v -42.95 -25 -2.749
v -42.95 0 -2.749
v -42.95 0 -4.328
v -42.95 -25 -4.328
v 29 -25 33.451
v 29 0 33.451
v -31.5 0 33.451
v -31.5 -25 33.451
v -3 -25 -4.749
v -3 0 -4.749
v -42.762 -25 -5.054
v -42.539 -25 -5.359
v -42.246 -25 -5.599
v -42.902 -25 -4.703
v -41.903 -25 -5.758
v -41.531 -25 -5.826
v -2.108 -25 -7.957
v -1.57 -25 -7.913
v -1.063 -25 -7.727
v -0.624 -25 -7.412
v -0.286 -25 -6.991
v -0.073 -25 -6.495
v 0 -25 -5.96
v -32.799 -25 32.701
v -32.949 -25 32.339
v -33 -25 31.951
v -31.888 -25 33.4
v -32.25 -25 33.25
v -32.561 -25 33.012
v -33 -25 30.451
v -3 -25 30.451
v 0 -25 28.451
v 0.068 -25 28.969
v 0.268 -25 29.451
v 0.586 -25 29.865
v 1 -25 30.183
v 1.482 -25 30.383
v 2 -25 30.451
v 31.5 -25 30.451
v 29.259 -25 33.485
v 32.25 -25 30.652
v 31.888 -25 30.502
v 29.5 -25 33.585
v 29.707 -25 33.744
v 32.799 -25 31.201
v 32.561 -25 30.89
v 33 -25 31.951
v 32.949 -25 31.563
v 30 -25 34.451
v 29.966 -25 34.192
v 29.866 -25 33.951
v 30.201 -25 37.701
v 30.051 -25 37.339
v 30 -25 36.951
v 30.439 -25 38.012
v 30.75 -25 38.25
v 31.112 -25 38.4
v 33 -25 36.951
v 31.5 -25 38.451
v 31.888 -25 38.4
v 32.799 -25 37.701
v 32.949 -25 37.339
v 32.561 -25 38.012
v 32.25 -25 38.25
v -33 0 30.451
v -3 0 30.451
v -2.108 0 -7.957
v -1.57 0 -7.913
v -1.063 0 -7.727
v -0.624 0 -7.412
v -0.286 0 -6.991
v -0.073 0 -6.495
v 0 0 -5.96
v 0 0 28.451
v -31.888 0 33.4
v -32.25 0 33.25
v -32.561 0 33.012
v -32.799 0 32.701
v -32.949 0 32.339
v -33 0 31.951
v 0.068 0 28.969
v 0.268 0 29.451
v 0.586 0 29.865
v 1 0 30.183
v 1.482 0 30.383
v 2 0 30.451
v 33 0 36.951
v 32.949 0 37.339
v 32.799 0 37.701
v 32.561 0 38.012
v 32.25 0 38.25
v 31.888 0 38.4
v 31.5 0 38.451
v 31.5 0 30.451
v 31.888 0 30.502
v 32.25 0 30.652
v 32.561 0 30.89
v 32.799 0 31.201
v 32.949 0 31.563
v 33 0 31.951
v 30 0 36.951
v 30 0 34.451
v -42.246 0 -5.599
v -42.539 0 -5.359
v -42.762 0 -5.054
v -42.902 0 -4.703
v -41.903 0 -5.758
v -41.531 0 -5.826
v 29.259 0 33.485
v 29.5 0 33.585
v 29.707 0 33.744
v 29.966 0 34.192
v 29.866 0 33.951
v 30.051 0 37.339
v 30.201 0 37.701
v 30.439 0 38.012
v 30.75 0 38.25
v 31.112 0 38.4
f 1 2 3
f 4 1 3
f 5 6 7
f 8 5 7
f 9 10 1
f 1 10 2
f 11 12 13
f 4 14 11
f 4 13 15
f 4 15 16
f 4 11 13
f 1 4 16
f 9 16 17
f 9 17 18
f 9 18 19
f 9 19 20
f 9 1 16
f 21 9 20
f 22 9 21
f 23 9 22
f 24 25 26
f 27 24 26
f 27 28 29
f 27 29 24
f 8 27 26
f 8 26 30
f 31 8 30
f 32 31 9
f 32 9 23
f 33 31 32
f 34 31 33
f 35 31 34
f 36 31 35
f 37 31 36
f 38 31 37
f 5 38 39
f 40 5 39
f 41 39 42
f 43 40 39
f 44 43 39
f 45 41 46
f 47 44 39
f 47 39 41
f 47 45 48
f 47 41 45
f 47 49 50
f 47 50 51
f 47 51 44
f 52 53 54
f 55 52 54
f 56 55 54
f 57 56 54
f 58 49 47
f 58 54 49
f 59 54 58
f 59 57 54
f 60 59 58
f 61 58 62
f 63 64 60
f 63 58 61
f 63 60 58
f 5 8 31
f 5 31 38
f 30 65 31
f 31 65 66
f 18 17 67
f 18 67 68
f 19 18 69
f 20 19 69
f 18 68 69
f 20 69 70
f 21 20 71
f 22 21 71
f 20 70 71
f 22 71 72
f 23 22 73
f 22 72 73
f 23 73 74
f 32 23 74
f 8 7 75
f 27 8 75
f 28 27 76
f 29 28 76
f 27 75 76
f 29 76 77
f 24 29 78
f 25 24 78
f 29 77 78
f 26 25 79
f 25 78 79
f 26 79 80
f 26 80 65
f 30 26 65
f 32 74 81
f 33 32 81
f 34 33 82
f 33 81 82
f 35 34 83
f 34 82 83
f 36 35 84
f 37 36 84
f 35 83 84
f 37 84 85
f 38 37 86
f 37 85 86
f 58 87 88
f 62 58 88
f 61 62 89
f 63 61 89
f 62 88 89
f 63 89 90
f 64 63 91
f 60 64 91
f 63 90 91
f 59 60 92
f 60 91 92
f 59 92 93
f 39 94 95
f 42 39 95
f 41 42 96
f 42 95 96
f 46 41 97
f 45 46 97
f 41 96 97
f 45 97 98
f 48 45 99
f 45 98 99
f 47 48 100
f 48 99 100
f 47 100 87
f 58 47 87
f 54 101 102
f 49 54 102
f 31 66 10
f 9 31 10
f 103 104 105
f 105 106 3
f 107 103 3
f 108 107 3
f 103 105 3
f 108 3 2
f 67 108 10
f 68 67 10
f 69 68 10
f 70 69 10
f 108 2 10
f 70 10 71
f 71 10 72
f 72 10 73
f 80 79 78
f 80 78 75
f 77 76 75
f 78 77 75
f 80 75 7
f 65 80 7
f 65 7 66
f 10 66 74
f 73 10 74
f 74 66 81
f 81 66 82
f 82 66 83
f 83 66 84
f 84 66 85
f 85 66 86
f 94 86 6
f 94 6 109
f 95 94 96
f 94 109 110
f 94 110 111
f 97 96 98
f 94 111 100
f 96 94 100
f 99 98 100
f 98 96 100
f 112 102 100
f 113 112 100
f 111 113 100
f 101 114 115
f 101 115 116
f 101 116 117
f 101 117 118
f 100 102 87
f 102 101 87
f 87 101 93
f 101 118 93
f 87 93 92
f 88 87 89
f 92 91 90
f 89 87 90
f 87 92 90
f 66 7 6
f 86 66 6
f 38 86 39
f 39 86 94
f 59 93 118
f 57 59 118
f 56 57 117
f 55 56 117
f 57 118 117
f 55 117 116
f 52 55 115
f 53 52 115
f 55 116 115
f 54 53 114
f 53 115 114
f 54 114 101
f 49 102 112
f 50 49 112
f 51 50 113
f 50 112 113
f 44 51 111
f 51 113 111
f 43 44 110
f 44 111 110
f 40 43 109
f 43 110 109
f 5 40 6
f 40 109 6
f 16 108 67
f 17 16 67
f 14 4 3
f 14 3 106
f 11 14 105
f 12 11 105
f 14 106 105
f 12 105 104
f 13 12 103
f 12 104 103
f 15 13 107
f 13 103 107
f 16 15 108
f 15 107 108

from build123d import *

# Parameters (mm, degrees)
F1_DEPTH = 25


with BuildPart() as f1:
    # F0 (on Front) → F1 (new body)
    with BuildSketch(Plane.XZ):
        with BuildLine():
            Line((29, 33.451155), (-31.5, 33.451155))
            ThreePointArc((-31.5, 33.451155), (-32.56066, 33.011816), (-33, 31.951155))
            Line((-33, 31.951155), (-33, 30.451155))
            Line((-33, 30.451155), (-3, 30.451155))
            Line((-3, 30.451155), (-3, -4.748845))
            Line((-3, -4.748845), (-42.949969, -2.748845))
            Line((-42.949969, -2.748845), (-42.949969, -4.327762))
            ThreePointArc((-42.949969, -4.327762), (-42.538887, -5.359391), (-41.530959, -5.825574))
            Line((-41.530959, -5.825574), (-2.107987, -7.957275))
            ThreePointArc((-2.107987, -7.957275), (-0.624495, -7.412083), (0, -5.960192))
            Line((0, -5.960192), (0, 28.451155))
            ThreePointArc((0, 28.451155), (0.585786, 29.865369), (2, 30.451155))
            Line((2, 30.451155), (31.5, 30.451155))
            ThreePointArc((31.5, 30.451155), (32.56066, 30.890495), (33, 31.951155))
            Line((33, 31.951155), (33, 36.951155))
            ThreePointArc((33, 36.951155), (32.56066, 38.011816), (31.5, 38.451155))
            ThreePointArc((31.5, 38.451155), (30.43934, 38.011816), (30, 36.951155))
            Line((30, 36.951155), (30, 34.451155))
            ThreePointArc((30, 34.451155), (29.707107, 33.744049), (29, 33.451155))
        make_face()
    extrude(amount=F1_DEPTH)


solid = f1.part
